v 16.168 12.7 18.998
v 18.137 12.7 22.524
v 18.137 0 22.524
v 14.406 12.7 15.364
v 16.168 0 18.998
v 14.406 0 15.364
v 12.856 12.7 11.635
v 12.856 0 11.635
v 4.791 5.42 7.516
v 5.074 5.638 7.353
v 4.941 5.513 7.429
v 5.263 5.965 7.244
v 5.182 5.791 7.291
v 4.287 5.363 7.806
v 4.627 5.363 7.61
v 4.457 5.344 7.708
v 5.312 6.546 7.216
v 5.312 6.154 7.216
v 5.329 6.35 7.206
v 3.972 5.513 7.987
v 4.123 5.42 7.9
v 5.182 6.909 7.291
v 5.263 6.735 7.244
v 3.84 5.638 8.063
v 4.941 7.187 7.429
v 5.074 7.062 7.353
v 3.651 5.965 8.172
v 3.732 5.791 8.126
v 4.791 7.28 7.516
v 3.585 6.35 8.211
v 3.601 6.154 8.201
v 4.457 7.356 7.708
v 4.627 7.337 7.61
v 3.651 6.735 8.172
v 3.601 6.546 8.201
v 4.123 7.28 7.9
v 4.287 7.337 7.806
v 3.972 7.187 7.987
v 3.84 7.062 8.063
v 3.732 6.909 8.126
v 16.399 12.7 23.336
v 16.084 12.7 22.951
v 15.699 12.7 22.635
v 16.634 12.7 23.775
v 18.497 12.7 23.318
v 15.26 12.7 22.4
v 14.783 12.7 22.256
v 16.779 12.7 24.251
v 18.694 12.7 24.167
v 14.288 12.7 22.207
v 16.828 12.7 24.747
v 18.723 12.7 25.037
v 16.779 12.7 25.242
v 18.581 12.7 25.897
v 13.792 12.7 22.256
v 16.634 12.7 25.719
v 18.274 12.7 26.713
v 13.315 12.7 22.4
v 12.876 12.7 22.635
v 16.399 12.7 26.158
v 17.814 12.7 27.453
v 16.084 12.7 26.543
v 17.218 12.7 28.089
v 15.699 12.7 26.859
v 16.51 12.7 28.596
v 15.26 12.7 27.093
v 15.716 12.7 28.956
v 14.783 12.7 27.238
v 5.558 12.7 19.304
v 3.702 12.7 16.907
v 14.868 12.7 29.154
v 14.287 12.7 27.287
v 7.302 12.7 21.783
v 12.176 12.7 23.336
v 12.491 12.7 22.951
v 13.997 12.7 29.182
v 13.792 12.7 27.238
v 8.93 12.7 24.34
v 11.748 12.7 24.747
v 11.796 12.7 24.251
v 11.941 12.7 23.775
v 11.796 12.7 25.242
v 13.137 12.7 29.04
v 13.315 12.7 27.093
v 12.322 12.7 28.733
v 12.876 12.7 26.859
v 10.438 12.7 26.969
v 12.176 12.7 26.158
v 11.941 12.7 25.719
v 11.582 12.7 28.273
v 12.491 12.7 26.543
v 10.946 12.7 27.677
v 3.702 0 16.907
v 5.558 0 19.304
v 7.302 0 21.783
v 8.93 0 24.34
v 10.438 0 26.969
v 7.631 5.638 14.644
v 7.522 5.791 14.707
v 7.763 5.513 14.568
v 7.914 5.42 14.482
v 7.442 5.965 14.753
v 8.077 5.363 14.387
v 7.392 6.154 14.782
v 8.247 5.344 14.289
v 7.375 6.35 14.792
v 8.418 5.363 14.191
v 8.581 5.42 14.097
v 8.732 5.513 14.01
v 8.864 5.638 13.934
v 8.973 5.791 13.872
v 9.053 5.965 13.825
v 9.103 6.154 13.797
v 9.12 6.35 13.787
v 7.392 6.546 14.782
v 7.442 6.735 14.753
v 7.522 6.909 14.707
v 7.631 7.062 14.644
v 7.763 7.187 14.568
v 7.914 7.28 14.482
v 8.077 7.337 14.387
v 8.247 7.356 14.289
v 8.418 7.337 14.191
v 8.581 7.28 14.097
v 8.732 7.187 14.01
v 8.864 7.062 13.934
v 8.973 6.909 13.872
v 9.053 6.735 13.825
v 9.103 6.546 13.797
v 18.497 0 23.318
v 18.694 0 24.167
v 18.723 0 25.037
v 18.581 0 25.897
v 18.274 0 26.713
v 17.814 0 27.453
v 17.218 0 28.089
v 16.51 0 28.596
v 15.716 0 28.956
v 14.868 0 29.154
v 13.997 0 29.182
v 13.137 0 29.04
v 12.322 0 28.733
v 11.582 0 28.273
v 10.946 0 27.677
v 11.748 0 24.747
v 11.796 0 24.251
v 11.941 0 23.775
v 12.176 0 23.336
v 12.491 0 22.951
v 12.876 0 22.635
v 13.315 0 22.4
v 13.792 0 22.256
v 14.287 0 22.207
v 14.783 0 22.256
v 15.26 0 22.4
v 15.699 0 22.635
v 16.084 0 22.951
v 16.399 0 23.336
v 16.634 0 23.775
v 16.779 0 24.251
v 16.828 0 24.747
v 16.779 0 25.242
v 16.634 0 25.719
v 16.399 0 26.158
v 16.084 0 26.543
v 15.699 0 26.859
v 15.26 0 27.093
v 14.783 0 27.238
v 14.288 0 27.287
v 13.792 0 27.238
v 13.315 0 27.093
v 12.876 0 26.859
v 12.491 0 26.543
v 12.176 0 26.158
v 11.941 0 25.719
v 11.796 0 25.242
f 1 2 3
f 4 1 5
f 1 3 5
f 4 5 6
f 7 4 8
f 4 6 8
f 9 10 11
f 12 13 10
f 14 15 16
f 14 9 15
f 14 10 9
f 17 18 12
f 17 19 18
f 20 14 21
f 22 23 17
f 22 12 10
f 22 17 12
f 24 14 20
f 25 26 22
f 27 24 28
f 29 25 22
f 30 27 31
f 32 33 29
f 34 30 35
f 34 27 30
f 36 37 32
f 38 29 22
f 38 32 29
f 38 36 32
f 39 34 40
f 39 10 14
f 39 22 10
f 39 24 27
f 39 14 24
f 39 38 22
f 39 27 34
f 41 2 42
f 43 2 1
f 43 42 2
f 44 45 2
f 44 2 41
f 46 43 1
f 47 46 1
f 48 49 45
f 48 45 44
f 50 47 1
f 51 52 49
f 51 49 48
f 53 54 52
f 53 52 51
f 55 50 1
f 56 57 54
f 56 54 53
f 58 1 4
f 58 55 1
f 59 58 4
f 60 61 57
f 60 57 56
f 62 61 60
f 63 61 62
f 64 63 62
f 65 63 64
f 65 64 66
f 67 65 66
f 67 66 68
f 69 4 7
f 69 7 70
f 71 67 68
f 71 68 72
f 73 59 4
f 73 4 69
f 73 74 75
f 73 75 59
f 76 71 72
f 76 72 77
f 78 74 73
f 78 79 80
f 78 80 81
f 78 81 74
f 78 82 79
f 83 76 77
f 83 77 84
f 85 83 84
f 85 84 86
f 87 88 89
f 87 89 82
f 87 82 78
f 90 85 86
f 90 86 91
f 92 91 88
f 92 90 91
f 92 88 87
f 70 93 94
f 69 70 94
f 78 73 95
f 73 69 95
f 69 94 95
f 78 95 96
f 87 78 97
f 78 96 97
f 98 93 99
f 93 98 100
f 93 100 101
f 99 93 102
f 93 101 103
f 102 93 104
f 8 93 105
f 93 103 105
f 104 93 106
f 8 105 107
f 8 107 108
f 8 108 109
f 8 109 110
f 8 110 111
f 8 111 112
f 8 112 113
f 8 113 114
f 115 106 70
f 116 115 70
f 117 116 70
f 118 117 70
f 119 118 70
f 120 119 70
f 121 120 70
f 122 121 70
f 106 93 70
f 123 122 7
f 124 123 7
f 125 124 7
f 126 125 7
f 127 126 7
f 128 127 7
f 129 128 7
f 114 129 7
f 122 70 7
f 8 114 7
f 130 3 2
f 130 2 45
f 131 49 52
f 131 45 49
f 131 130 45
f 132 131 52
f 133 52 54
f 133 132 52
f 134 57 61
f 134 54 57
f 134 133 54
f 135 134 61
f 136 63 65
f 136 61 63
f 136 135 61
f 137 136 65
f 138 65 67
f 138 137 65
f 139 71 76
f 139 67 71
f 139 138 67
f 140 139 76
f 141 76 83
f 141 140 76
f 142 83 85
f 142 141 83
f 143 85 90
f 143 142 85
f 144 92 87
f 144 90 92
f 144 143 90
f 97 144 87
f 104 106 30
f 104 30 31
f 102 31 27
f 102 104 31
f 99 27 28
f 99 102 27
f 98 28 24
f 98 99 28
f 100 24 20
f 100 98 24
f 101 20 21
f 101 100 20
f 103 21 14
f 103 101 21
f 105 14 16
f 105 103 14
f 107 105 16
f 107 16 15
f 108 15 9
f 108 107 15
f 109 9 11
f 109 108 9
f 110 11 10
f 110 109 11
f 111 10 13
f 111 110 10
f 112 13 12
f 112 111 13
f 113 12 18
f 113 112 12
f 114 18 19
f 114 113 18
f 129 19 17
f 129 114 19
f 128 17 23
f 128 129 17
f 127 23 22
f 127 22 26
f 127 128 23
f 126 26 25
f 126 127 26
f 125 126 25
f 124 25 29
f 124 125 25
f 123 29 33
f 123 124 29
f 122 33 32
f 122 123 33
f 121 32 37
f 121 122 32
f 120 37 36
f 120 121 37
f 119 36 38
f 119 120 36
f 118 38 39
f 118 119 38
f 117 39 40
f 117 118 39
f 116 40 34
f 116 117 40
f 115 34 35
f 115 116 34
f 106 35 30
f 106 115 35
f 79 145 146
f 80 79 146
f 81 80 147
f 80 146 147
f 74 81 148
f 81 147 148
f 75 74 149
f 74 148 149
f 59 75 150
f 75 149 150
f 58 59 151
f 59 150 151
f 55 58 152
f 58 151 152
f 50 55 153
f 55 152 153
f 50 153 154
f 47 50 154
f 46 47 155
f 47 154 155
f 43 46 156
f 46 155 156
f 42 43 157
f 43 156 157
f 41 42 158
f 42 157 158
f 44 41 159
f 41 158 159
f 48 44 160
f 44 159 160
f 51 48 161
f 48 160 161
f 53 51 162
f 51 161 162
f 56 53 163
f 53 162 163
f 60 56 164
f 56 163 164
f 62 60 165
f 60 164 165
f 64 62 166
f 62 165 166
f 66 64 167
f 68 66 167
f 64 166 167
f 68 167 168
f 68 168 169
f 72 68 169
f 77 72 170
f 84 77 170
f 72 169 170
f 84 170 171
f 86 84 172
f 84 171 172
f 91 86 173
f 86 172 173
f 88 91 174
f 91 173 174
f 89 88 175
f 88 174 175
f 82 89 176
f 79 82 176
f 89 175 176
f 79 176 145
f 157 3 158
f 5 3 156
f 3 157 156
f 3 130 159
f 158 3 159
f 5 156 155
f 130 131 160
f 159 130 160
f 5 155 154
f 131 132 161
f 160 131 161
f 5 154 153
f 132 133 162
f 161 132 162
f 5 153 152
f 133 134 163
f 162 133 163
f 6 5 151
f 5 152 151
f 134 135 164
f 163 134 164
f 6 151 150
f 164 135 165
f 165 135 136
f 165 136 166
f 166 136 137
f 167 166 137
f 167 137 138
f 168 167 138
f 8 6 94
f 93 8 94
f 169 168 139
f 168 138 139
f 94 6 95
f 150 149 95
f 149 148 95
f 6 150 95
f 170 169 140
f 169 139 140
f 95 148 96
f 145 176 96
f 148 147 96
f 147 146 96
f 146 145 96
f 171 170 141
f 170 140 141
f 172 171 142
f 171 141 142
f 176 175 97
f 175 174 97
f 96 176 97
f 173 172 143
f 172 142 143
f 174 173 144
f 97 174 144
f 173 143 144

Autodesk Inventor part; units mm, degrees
ref_plane "YZ Plane" through (0, 0, 0) normal (1, 0, 0) x (0, 1, 0)
ref_plane "XZ Plane" through (0, 0, 0) normal (0, 1, 0) x (-1, 0, 0)
ref_plane "XY Plane" through (0, 0, 0) normal (0, 0, 1) x (1, 0, 0)
sketch "Sketch1" plane through (0, 0, 0) normal (0, 1, 0) x (-1, 0, 0)
  line L0 (0, 0) -> (28.575, 0)
  line L1 (28.575, 0) -> (0, 0)
  line L2 (0, 0) -> (-14.2875, -24.7467)
  line L3 (0, 0) -> (28.575, 0) construction
  line L4 (0, 0) -> (-14.2875, 24.7467)
  line L5 (0, 0) -> (28.575, 0) construction
  circle A0 centre (28.575, 0) radius 2.54
  circle A1 centre (-14.2875, -24.7467) radius 2.54
  circle A2 centre (-14.2875, 24.7467) radius 2.54
  circle A3 centre (0, 0) radius 3.175
  dimension "d0" = 28.575
  dimension "d1" = 28.575
  dimension "d2" = 120
  dimension "d3" = 28.575
  dimension "d4" = 120
  dimension "d5" = 5.08
  dimension "d6" = 5.08
  dimension "d7" = 5.08
  dimension "d9" = 6.35
sketch "Sketch2" plane through (0, 0, 0) normal (0, 1, 0) x (-1, 0, 0)
  circle A0 centre (28.575, 0) radius 2.54 projected
  circle A1 centre (-14.2875, -24.7467) radius 2.54 projected
  circle A2 centre (-14.2875, 24.7467) radius 2.54 projected
  circle A3 centre (28.575, 0) radius 4.445
  circle A4 centre (-14.2875, -24.7467) radius 4.445
  circle A5 centre (-14.2875, 24.7467) radius 4.445
  circle A6 centre (0, 0) radius 6.35
  circle A7 centre (0, 0) radius 9.525
  line L0 (28.575, 4.445) -> (28.575, -4.445)
  line L1 (-14.2875, 24.7467) -> (0, 0)
  line L2 (0, 0) -> (-14.2875, 24.7467)
  line L3 (-14.2875, 24.7467) -> (-10.438, 26.9692)
  line L4 (-14.2875, 24.7467) -> (-18.137, 22.5242)
  line L5 (0, 0) -> (-14.2875, -24.7467)
  line L6 (-10.438, -26.9692) -> (-14.2875, -24.7467)
  line L7 (-18.137, -22.5242) -> (-14.2875, -24.7467)
  arc A8 (4.7625, 8.2489) -> (28.575, 4.445) centre (26.9969, 71.0017) ccw
  arc A9 (28.575, -4.445) -> (4.7625, -8.2489) centre (26.881, -70.2762) ccw
  arc A10 (4.7625, -8.2489) -> (-10.438, -26.9692) centre (47.4204, -58.4177) ccw
  arc A11 (-18.137, -22.5242) -> (-9.525, 0) centre (-74.3014, 11.8584) ccw
  arc A12 (-9.525, 0) -> (-18.137, 22.5242) centre (-78.365, -13.4121) ccw
  arc A13 (-10.438, 26.9692) -> (4.7625, 8.2489) centre (47.4204, 58.4177) ccw
  arc A14 (-3.702, 16.9073) -> (16.4951, 5.2598) centre (24.8224, 43.0343) ccw
  arc A15 (16.4931, -5.2477) -> (-3.702, -16.9073) centre (24.8816, -43.0963) ccw
  line L8 (-9.525, 0) -> (-10.9982, 0)
  arc A16 (-12.7912, -11.6596) -> (-12.8557, 11.635) centre (-49.0728, -0.1126) ccw
  dimension "d10" = 8.89
  dimension "d11" = 8.89
  dimension "d12" = 8.89
  dimension "d13" = 12.7
  dimension "d14" = 19.05
  dimension "d15" = 1.4732
extrude "Extrusion1" add sketch "Sketch2" along normal blind 12.7 contours A0 L0 A3 | A0 L0 A9 A7 A8 | L6 A1 L5 A4 | A11 A7 L5 A4 | L4 A2 L1 A5 | A13 A7 L1 A5 | A8 A13 A14 | A15 A10 A9 | A7 L5 A6 L1 | A4 L7 A1 L6 | A10 A4 L5 A7 | L1 A6 L5 A7 | A5 L3 A2 L4 | A7 A12 A5 L1 | A5 L1 A2 L3 | L8 A16 A12 | A11 A16 L8 | L1 L5 A6 | A6 L5 L1 | L5 A1 L7 A4
hole "Hole1" at (0, 0, 0) direction (0, 1, 0) diameter 6.35 end through all
sketch "Sketch3" plane through (0, 12.7, 0) normal (0, 1, 0) x (1, 0, 0)
  circle A0 centre (0, 0) radius 3.175 projected
hole "Hole2" at (0, 12.7, 0) direction (0, -1, 0) diameter 6.604 end through all
sketch "Sketch4" plane through (0, 12.7, 0) normal (0, 1, 0) x (1, 0, 0)
  circle A0 centre (-10.3993, 5.2212) radius 3.175 projected
  circle A1 centre (-10.8149, -4.2948) radius 3.175 projected
  point P0 (0, 0)
hole "Hole3" at (-10.3993, 12.7, -5.2212) at (-10.8149, 12.7, 4.2948) direction (0, -1, 0) diameter 6.35 depth 162.56
sketch "Sketch5" plane through (0, 12.7, 0) normal (0, 1, 0) x (1, 0, 0)
  arc A0 (-16.4951, -5.2598) -> (-28.575, -4.445) centre (-26.9969, -71.0017) ccw projected
  arc A1 (-28.575, 4.445) -> (-16.4931, 5.2477) centre (-26.881, 70.2762) ccw projected
  line L0 (-16.4951, -5.2598) -> (-16.4931, 5.2477)
  arc A2 (10.438, -26.9692) -> (3.702, -16.9073) centre (-47.4204, -58.4177) ccw projected
  arc A3 (12.8557, -11.635) -> (18.137, -22.5242) centre (78.365, 13.4121) ccw projected
  line L1 (3.702, -16.9073) -> (12.8557, -11.635)
  arc A4 (18.137, 22.5242) -> (12.7912, 11.6596) centre (74.3014, -11.8584) ccw projected
  arc A5 (3.702, 16.9073) -> (10.438, 26.9692) centre (-47.4204, 58.4177) ccw projected
  line L2 (12.7912, 11.6596) -> (3.702, 16.9073)
  arc A6 (18.137, 22.5242) -> (10.438, 26.9692) centre (14.2875, 24.7467) ccw projected
  arc A7 (-28.575, 4.445) -> (-28.575, -4.445) centre (-28.575, 0) ccw projected
  point P0 (0, 0)
sketch "Sketch6" plane through (0, 12.7, 0) normal (0, 1, 0) x (1, 0, 0)
  arc A0 (-13.4646, 6.0485) -> (-8.668, 7.8826) centre (-10.3993, 5.2212) ccw projected
  line L0 (-10.3993, 5.2212) -> (-7.2243, 5.2212)
  line L1 (-10.3993, 5.2212) -> (-13.5743, 5.2212)
  line L2 (-13.5743, 5.2212) -> (-13.5743, 8.7596)
  line L3 (-13.5743, 8.7596) -> (-7.2855, 8.8652)
  line L4 (-7.2855, 8.8652) -> (-7.2243, 5.2212)
  arc A1 (-9.9167, -7.3401) -> (-13.4529, -6.0614) centre (-10.8149, -4.2948) ccw projected
  line L5 (-10.8149, -4.2948) -> (-13.9899, -4.2948)
  line L6 (-13.9899, -4.2948) -> (-13.9899, -9.3241)
  line L7 (-10.8149, -4.2948) -> (-7.6399, -4.2948)
  line L8 (-7.6399, -4.2948) -> (-7.6399, -9.0772)
  line L9 (-7.6399, -9.0772) -> (-13.9899, -9.3241)
  point P0 (0, 0)
extrude "Extrusion2" cut sketch "Sketch6" against normal blind 25.4 contours L2 L3 L4 L0 L1 | L8 L9 L6 L5 L7
sketch "Sketch7" plane through (0, 12.7, 0) normal (0, 1, 0) x (1, 0, 0)
  arc A0 (12.7912, 11.6596) -> (12.8557, -11.635) centre (49.0728, 0.1126) ccw projected
  arc A1 (12.7912, 11.6596) -> (12.8557, -11.635) centre (49.0728, 0.1126) ccw
  arc A2 (-7.2803, 8.5554) -> (3.702, 16.9073) centre (-24.8816, 43.0963) ccw projected
  arc A3 (-16.4931, 5.2477) -> (3.702, 16.9073) centre (-24.8816, 43.0963) ccw
  arc A4 (-13.9899, -5.9006) -> (-16.4951, -5.2598) centre (-24.8224, -43.0343) ccw projected
  arc A5 (3.702, -16.9073) -> (-16.4951, -5.2598) centre (-24.8224, -43.0343) ccw
  arc A6 (-28.575, 4.445) -> (-16.4931, 5.2477) centre (-26.881, 70.2762) ccw projected
  line L0 (-16.4931, 5.2477) -> (-16.4951, -5.2598)
  line L1 (3.702, -16.9073) -> (12.8557, -11.635)
  line L2 (3.702, 16.9073) -> (12.7912, 11.6596)
  point P0 (0, 0)
  point P1 (-7.2803, 8.5554)
  point P2 (-13.9899, -5.9006)
extrude "Extrusion3" cut sketch "Sketch7" against normal blind 25.4
extrude "Extrusion4" cut sketch "Sketch5" against normal blind 25.4
sketch "Sketch9" plane through (3.702, 0, 16.9073) normal (-0.4991072, 0, -0.8665403) x (-0.8665403, 0, 0.4991072)
  line L0 (0, 0) -> (0, 12.7) projected
  line L1 (0, 6.35) -> (-10.5635, 6.35)
  line L2 (-10.5635, 0) -> (-10.5635, 12.7) projected
  line L3 (-7.8001, 12.7) -> (-2.7201, 12.7) projected
  line L4 (-5.2601, 12.7) -> (-5.2307, 0)
  circle A0 centre (-5.2454, 6.35) radius 1.0065
  dimension "d45" = 2.013
extrude "Extrusion5" add sketch "Sketch9" along normal blind 7.5946
thread "Thread1" size "M2.5x0.45" class "6g" standard "ISO Metric profile" full length
properties part number "screw in stablity"
